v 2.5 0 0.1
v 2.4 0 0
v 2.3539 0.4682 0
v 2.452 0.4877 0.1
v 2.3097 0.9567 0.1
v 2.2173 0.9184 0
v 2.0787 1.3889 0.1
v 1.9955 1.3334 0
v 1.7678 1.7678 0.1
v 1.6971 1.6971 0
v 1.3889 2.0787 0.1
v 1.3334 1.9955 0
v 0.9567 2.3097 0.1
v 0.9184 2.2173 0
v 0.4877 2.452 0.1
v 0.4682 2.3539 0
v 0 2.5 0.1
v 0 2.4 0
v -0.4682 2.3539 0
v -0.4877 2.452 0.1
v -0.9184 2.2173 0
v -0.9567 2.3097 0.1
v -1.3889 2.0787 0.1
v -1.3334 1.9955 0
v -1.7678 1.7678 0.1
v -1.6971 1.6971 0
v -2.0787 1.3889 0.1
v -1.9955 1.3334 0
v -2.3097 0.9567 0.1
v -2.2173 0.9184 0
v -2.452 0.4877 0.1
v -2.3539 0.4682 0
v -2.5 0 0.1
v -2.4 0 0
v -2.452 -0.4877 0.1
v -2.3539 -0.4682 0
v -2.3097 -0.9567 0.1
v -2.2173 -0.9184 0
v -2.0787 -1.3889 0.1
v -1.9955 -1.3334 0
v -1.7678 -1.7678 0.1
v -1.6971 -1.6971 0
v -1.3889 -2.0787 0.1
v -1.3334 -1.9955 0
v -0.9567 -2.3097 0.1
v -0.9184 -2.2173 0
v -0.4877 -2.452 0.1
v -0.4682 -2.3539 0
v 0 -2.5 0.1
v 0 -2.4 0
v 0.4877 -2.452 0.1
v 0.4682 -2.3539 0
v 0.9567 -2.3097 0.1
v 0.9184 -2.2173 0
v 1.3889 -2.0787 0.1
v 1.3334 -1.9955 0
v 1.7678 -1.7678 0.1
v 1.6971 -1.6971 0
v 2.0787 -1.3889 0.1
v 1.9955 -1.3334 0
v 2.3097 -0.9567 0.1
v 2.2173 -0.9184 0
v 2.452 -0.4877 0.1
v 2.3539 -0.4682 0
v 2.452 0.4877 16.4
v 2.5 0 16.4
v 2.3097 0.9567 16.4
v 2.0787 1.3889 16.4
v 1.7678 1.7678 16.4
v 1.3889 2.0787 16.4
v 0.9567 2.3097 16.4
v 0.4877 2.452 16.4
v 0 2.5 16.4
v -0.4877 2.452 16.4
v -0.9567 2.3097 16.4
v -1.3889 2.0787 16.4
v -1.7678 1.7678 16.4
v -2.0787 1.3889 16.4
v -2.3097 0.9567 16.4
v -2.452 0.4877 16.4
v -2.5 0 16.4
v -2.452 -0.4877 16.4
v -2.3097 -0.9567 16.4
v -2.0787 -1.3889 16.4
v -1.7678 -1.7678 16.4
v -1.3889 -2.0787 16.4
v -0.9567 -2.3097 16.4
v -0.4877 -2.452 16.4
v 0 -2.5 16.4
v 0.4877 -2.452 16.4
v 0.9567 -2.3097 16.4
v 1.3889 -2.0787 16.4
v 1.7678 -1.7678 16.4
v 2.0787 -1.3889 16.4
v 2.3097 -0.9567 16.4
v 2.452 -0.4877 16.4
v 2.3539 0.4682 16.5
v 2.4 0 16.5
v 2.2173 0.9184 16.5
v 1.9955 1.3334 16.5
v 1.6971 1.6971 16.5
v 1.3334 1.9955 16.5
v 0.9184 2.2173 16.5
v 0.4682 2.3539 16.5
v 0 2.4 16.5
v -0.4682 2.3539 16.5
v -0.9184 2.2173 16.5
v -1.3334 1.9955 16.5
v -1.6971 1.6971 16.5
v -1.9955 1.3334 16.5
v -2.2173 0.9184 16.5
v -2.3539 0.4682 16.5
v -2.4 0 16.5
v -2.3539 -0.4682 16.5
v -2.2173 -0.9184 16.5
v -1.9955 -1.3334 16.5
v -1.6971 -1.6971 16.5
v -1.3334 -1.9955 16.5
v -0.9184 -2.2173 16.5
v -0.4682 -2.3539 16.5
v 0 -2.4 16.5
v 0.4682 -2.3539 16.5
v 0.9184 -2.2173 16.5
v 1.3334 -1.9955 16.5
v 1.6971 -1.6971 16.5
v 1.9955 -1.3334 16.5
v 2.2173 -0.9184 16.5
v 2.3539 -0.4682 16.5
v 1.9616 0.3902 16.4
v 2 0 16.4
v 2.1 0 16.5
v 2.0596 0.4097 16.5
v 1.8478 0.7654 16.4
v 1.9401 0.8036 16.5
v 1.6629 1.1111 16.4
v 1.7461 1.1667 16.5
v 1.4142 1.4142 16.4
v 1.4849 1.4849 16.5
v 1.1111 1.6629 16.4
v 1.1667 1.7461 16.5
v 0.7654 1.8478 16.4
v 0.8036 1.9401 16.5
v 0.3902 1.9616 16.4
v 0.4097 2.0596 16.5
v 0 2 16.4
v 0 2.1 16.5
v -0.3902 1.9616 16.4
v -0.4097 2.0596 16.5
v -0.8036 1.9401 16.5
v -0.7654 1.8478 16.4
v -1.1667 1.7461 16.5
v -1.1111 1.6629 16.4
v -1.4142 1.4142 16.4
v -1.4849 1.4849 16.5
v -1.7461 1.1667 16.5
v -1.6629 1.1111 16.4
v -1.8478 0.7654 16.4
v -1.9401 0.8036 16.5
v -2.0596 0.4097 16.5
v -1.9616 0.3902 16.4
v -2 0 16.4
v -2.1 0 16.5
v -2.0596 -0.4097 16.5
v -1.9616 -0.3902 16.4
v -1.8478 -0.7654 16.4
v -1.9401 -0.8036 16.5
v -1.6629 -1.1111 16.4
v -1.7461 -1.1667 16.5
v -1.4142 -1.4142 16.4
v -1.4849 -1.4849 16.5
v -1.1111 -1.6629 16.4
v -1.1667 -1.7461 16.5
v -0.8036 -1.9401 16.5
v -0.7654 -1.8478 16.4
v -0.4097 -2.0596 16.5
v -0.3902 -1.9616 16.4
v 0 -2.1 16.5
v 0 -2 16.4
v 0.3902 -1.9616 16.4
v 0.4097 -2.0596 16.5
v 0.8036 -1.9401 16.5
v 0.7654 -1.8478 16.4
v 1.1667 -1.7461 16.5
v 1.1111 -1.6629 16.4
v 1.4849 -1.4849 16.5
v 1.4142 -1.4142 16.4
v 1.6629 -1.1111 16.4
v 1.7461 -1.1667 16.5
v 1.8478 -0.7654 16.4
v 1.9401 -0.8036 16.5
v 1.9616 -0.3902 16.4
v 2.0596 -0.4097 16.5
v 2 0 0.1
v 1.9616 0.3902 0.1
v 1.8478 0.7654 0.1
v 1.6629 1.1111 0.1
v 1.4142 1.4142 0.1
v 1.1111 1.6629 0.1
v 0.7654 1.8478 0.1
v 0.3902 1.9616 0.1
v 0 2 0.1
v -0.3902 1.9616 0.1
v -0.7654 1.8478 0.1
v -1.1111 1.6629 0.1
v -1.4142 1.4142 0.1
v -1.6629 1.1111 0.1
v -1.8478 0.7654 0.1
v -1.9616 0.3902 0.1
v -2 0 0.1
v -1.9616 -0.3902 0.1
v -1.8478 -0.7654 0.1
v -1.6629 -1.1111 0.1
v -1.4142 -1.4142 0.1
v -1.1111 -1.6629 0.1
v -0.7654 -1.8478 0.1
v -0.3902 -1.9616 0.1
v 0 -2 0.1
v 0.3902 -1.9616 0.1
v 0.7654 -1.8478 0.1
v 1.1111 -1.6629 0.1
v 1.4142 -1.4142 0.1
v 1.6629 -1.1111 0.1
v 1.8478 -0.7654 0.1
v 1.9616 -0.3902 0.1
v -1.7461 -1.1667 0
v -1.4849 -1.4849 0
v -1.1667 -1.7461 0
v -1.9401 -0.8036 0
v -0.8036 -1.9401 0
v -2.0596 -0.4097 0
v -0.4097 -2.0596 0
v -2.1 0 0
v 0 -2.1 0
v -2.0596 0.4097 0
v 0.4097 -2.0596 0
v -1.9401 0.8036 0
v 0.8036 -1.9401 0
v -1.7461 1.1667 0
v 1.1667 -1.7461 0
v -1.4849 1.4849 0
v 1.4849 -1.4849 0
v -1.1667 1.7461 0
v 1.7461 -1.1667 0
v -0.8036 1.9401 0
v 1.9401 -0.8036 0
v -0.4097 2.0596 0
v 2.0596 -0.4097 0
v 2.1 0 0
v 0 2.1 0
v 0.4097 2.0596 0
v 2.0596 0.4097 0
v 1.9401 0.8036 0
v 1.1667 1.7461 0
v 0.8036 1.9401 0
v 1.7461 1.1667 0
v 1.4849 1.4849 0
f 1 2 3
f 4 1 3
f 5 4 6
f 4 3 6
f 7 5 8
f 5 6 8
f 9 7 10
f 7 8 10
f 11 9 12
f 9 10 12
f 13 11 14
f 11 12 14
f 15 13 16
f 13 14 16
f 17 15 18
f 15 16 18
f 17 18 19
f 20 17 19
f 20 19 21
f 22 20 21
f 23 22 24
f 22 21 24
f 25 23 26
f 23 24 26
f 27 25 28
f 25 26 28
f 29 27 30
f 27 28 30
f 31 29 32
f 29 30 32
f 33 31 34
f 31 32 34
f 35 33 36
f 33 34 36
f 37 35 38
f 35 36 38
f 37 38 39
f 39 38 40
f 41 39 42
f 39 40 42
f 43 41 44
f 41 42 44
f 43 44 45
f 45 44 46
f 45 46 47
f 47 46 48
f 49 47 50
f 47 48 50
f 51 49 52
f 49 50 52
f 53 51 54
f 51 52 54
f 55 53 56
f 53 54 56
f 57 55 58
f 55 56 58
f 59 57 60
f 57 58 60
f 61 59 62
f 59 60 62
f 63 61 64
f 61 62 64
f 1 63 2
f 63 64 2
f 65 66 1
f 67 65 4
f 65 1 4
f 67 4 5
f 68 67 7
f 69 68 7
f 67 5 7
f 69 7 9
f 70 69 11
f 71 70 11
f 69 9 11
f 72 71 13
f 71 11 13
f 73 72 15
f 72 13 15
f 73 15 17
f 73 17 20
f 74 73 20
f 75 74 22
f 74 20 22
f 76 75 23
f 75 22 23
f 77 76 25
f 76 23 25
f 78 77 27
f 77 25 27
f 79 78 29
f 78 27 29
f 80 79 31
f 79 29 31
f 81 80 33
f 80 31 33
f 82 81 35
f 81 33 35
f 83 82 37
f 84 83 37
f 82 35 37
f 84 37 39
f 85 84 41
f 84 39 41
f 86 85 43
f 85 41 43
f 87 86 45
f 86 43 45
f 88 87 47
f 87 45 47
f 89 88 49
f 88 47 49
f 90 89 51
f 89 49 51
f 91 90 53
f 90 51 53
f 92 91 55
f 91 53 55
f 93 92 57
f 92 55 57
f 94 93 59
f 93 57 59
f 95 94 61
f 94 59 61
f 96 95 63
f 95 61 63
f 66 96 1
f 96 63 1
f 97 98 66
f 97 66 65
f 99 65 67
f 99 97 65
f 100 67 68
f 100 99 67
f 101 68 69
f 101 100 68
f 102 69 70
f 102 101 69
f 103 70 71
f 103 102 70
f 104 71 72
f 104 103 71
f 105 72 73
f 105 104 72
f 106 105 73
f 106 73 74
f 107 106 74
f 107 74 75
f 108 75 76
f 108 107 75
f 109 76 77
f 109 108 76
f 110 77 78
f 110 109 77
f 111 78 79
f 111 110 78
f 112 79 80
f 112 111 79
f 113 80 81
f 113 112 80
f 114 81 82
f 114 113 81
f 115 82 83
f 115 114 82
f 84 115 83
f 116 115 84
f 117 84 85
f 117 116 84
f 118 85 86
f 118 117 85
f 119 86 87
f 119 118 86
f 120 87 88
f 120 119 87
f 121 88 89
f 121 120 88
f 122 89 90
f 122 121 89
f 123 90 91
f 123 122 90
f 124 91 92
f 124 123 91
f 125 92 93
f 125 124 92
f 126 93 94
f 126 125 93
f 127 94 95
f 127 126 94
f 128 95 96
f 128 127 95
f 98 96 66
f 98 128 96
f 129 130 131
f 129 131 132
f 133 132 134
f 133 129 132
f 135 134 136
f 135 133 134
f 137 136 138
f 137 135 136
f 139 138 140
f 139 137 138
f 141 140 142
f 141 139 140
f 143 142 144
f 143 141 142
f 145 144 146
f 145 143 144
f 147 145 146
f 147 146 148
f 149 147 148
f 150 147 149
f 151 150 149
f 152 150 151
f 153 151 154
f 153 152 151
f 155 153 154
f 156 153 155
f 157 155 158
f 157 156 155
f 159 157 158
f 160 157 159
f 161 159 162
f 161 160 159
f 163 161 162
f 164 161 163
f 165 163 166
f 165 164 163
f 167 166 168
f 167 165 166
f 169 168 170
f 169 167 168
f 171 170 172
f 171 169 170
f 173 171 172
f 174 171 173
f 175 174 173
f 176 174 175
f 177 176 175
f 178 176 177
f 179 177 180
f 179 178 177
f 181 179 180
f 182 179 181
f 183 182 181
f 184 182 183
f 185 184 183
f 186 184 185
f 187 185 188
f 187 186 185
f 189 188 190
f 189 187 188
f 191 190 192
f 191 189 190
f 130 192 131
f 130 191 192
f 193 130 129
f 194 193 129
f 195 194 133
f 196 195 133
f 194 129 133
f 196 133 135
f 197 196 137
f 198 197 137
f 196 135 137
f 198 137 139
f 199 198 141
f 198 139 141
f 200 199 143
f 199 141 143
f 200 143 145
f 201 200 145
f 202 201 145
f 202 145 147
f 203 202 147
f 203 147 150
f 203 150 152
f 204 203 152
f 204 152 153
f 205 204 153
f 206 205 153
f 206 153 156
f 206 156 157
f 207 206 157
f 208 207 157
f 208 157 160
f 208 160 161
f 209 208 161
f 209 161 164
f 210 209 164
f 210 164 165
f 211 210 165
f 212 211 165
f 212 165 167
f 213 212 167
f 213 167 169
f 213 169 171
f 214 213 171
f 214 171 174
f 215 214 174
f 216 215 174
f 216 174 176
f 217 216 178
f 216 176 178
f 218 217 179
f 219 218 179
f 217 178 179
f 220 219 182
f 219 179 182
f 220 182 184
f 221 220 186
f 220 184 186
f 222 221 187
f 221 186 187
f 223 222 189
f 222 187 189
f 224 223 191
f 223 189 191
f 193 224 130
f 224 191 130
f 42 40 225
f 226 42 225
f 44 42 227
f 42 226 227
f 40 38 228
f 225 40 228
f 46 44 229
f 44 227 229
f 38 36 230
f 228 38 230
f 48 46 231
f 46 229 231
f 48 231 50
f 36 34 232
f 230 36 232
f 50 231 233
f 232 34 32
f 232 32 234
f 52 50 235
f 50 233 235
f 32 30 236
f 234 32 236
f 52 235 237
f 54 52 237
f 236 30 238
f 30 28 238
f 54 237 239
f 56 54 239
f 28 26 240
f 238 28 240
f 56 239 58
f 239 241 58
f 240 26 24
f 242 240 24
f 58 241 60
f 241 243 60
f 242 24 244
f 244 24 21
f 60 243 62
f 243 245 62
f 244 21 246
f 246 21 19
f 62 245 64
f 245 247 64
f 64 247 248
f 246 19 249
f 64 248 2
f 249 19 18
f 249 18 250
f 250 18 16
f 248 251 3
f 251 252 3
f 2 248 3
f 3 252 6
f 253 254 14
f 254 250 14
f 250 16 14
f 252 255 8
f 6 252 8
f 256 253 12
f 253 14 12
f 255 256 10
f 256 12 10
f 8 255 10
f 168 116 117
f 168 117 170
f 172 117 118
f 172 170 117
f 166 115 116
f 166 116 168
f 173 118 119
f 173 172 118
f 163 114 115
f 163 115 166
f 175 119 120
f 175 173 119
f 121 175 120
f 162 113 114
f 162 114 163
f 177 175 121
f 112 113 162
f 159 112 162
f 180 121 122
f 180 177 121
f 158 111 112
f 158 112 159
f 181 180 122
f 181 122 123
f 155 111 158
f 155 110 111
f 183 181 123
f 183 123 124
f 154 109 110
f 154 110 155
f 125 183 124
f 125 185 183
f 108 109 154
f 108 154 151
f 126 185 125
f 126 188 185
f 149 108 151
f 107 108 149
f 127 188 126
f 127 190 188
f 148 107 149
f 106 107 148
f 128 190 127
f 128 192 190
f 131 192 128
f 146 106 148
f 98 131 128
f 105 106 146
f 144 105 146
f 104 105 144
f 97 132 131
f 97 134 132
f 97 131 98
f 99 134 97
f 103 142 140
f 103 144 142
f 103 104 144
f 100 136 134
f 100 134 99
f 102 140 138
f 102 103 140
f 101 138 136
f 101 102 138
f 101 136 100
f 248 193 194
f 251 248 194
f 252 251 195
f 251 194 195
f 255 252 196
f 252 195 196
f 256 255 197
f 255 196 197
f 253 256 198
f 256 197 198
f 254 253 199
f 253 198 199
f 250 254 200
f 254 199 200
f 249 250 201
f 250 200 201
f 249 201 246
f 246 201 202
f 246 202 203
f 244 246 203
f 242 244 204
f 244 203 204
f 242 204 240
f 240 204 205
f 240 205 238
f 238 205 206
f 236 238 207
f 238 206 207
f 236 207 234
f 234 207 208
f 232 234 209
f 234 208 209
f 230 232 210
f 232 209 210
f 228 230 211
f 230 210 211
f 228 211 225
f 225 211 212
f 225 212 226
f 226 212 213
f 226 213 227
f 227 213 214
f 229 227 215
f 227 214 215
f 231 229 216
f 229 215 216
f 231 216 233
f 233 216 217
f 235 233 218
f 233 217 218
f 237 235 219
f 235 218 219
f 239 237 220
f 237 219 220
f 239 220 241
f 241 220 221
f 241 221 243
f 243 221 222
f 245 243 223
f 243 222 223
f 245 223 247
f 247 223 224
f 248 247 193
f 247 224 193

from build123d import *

# Parameters (mm, degrees)
F0_R     = 2.5
F1_DEPTH = 16.5
F2_R     = 2
F3_DEPTH = 16.501
F4_SIZE  = 0.1


with BuildPart() as f1:
    # F0 (on Top) → F1 (new body)
    with BuildSketch(Plane.XY):
        Circle(F0_R)
    extrude(amount=F1_DEPTH)

    # F2 (on face) → F3 (cut, through all)
    with BuildSketch(Plane.XY.offset(16.5)):
        Circle(F2_R)
    extrude(amount=-F3_DEPTH, mode=Mode.SUBTRACT)

    # F4
    f4_edges = [f1.edges().sort_by_distance(p)[0] for p in [
        (-2, 0, 0),
        (-2.5, 0, 0),
        (-2.5, 0, 16.5),
        (-2, 0, 16.5),
    ]]
    chamfer(f4_edges, length=F4_SIZE)


solid = f1.part
